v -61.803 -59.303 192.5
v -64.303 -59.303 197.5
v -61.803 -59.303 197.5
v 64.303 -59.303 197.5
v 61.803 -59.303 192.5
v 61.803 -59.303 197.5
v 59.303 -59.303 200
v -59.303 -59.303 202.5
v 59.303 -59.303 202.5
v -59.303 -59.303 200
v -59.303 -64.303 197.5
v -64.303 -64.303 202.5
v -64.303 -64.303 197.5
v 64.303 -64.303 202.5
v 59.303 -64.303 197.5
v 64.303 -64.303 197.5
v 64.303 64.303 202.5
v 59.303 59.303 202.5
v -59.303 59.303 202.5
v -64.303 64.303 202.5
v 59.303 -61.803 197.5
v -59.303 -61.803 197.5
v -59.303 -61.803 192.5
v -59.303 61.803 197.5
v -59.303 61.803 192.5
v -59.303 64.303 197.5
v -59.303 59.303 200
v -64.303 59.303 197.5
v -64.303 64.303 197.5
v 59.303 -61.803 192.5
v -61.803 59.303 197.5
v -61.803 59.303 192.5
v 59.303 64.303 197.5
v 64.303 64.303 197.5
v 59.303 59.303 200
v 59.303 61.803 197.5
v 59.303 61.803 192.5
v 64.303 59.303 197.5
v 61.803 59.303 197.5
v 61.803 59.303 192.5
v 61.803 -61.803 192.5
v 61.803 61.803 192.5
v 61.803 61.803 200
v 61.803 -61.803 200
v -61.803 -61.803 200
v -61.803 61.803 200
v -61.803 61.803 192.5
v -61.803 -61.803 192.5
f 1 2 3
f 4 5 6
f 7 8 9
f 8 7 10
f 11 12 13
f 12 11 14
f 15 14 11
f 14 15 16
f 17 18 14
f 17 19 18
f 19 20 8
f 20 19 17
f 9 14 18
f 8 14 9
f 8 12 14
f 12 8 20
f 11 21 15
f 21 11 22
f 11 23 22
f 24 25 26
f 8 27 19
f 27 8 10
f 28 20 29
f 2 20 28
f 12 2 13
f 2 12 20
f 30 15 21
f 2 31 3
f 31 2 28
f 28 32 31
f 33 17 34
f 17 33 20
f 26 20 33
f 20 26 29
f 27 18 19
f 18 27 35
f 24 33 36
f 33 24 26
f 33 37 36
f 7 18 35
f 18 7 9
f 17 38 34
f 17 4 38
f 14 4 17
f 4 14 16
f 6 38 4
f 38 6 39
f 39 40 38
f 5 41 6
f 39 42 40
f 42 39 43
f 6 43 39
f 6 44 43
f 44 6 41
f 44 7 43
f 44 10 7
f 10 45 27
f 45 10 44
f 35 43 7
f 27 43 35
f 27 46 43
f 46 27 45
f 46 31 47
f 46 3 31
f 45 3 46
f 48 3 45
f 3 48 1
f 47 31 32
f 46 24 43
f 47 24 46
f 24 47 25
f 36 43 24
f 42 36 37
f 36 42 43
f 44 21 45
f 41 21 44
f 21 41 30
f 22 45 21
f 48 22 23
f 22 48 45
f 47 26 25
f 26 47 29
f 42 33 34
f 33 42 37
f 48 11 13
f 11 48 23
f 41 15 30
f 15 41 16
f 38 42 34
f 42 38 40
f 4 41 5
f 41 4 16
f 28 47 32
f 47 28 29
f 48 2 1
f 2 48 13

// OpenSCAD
gr = (1+sqrt(5))/2;
h = 200;
w = h/gr;
br = 5;

difference(){
intersection(){
    #translate([-w/2,-w/2,0]) difference(){
        frame();
        cube([w,w,h]);
        translate([w/2,w/2,-5]) cylinder(  10, d1=40.4, d2=40.4);
    //#translate([w/2,w/2,0])
    //translate([0,0,2*h-br*1.5])
    //rotate([180,0,0]) translate([-h,-h,0]) pyramid(h*2,h*2,h*2);
    }
translate([0,0,3*h-br*1.5-w])
rotate([180,0,0]) translate([-h,-h,0]) pyramid(h*2,h*2,h*2);
}

}



 
 module pyramid(w, l, h) {
	mw = w/2;
	ml = l/2;
	polyhedron(points = [
		[0,  0,  0],
		[w,  0,  0],
		[0,  l,  0],
		[w,  l,  0],
		[mw, ml, h]
	], faces = [
		[4, 1, 0],
		[4, 3, 1],
		[4, 2, 3],
		[4, 0, 2],
		//base
		[0, 1, 2],
		[2, 1, 3]
	]);
}


module frame() {
    face();
    rotate([0,0,90]) face();
    translate([0,w,0]) face();
    rotate([0,0,90]) translate([0,-w,0]) face();

    translate([0,0,-br/2]) cube([w,w,1]);    
}



module face() {
    translate([0,-br/2,0]){
        translate([0,0,-br/2]) cube([w,br,br]);
        translate([0,0,h-br/2]) cube([w,br,br]);
        translate([0,0,w-br/2]) cube([w,br,br]);
        translate([-br/2,0,-br/2]) cube([br,br,h+br]);
        translate([w-br/2,0,-br/2]) cube([br,br,h+br]);
    }    
}
